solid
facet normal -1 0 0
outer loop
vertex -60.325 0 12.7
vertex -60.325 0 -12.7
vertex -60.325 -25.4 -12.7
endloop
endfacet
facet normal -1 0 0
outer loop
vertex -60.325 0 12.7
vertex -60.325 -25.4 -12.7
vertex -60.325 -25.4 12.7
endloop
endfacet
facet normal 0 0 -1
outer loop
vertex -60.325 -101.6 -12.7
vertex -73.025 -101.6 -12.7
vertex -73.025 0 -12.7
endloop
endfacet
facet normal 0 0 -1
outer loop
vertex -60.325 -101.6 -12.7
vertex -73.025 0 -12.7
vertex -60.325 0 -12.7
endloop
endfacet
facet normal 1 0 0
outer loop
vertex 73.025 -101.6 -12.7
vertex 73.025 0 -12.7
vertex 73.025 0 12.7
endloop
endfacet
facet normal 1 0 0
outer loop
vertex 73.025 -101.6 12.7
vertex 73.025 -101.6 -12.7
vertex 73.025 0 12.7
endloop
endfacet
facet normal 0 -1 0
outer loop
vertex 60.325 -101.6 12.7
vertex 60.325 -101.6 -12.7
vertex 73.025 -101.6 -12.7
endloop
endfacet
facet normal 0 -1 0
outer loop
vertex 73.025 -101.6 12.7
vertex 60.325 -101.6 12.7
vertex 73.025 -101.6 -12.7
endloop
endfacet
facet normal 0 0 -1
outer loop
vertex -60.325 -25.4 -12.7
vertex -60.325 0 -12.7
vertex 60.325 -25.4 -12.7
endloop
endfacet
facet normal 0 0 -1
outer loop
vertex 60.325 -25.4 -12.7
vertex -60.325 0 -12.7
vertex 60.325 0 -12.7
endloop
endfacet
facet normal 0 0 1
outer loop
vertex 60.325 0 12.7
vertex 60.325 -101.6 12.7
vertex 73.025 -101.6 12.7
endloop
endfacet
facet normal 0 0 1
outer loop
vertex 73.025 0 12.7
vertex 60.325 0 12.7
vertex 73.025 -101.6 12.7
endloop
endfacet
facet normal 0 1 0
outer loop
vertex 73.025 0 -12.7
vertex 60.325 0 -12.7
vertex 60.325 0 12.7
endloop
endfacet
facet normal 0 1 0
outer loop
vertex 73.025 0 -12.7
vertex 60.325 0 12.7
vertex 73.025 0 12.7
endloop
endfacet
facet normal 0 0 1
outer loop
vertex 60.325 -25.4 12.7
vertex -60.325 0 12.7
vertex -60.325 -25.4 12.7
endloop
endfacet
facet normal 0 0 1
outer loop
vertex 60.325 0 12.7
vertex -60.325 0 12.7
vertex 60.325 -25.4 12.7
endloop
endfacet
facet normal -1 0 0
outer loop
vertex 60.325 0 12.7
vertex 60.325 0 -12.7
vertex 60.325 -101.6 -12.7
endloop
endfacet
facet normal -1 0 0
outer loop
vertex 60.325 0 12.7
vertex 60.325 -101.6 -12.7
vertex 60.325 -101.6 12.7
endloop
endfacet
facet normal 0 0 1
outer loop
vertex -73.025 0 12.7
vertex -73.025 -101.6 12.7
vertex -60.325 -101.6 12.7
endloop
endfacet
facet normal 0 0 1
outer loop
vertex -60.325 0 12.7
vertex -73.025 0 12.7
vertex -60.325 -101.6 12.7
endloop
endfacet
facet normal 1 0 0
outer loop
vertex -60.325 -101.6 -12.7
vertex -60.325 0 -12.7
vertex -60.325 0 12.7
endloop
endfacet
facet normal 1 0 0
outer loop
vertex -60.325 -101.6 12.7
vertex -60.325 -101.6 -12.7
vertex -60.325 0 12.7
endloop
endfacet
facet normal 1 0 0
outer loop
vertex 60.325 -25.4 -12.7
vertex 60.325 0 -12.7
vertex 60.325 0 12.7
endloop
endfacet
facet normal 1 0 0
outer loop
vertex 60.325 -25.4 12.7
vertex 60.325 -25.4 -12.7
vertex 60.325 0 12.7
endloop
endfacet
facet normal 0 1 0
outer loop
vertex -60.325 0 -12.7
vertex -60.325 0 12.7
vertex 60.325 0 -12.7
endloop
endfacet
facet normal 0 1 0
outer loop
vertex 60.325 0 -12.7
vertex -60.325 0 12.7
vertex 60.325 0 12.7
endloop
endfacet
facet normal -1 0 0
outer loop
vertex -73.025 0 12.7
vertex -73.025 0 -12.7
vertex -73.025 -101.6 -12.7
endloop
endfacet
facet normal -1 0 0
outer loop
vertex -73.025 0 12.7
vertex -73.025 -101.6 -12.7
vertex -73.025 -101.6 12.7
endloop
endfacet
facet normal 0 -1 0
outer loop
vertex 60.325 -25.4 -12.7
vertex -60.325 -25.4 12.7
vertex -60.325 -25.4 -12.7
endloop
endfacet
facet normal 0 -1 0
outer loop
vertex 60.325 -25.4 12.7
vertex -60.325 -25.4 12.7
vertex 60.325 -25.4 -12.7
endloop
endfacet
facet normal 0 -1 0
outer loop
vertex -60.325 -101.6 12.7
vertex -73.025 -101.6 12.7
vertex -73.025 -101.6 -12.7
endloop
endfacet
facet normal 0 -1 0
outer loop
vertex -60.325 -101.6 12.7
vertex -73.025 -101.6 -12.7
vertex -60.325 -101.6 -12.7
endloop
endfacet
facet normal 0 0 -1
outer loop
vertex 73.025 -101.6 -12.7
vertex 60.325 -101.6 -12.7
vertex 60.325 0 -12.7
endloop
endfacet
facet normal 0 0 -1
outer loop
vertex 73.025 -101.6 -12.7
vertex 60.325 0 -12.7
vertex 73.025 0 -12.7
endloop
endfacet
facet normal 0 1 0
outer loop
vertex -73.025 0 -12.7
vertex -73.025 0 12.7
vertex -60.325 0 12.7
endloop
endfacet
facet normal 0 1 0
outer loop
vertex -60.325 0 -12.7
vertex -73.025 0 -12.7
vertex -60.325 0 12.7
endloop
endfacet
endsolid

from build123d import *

# Parameters (mm, degrees)
F0_W     = 120.65
F0_H     = 25.4
F1_DEPTH = 25.4
F0_W_2   = 12.7
F2_DEPTH = 101.6


with BuildPart() as f1:
    # F0 (on Front) → F1 (new body)
    with BuildSketch(Plane.XZ):
        Rectangle(F0_W, F0_H)
    extrude(amount=F1_DEPTH)


with BuildPart() as f2:
    # F0 (on Front) → F2 (new body)
    with BuildSketch(Plane.XZ):
        with Locations((-66.675, 0)):
            Rectangle(F0_W_2, F0_H)
        with Locations((66.675, 0)):
            Rectangle(F0_W_2, F0_H)
    extrude(amount=F2_DEPTH)


solid = Compound([f1.part, f2.part])
